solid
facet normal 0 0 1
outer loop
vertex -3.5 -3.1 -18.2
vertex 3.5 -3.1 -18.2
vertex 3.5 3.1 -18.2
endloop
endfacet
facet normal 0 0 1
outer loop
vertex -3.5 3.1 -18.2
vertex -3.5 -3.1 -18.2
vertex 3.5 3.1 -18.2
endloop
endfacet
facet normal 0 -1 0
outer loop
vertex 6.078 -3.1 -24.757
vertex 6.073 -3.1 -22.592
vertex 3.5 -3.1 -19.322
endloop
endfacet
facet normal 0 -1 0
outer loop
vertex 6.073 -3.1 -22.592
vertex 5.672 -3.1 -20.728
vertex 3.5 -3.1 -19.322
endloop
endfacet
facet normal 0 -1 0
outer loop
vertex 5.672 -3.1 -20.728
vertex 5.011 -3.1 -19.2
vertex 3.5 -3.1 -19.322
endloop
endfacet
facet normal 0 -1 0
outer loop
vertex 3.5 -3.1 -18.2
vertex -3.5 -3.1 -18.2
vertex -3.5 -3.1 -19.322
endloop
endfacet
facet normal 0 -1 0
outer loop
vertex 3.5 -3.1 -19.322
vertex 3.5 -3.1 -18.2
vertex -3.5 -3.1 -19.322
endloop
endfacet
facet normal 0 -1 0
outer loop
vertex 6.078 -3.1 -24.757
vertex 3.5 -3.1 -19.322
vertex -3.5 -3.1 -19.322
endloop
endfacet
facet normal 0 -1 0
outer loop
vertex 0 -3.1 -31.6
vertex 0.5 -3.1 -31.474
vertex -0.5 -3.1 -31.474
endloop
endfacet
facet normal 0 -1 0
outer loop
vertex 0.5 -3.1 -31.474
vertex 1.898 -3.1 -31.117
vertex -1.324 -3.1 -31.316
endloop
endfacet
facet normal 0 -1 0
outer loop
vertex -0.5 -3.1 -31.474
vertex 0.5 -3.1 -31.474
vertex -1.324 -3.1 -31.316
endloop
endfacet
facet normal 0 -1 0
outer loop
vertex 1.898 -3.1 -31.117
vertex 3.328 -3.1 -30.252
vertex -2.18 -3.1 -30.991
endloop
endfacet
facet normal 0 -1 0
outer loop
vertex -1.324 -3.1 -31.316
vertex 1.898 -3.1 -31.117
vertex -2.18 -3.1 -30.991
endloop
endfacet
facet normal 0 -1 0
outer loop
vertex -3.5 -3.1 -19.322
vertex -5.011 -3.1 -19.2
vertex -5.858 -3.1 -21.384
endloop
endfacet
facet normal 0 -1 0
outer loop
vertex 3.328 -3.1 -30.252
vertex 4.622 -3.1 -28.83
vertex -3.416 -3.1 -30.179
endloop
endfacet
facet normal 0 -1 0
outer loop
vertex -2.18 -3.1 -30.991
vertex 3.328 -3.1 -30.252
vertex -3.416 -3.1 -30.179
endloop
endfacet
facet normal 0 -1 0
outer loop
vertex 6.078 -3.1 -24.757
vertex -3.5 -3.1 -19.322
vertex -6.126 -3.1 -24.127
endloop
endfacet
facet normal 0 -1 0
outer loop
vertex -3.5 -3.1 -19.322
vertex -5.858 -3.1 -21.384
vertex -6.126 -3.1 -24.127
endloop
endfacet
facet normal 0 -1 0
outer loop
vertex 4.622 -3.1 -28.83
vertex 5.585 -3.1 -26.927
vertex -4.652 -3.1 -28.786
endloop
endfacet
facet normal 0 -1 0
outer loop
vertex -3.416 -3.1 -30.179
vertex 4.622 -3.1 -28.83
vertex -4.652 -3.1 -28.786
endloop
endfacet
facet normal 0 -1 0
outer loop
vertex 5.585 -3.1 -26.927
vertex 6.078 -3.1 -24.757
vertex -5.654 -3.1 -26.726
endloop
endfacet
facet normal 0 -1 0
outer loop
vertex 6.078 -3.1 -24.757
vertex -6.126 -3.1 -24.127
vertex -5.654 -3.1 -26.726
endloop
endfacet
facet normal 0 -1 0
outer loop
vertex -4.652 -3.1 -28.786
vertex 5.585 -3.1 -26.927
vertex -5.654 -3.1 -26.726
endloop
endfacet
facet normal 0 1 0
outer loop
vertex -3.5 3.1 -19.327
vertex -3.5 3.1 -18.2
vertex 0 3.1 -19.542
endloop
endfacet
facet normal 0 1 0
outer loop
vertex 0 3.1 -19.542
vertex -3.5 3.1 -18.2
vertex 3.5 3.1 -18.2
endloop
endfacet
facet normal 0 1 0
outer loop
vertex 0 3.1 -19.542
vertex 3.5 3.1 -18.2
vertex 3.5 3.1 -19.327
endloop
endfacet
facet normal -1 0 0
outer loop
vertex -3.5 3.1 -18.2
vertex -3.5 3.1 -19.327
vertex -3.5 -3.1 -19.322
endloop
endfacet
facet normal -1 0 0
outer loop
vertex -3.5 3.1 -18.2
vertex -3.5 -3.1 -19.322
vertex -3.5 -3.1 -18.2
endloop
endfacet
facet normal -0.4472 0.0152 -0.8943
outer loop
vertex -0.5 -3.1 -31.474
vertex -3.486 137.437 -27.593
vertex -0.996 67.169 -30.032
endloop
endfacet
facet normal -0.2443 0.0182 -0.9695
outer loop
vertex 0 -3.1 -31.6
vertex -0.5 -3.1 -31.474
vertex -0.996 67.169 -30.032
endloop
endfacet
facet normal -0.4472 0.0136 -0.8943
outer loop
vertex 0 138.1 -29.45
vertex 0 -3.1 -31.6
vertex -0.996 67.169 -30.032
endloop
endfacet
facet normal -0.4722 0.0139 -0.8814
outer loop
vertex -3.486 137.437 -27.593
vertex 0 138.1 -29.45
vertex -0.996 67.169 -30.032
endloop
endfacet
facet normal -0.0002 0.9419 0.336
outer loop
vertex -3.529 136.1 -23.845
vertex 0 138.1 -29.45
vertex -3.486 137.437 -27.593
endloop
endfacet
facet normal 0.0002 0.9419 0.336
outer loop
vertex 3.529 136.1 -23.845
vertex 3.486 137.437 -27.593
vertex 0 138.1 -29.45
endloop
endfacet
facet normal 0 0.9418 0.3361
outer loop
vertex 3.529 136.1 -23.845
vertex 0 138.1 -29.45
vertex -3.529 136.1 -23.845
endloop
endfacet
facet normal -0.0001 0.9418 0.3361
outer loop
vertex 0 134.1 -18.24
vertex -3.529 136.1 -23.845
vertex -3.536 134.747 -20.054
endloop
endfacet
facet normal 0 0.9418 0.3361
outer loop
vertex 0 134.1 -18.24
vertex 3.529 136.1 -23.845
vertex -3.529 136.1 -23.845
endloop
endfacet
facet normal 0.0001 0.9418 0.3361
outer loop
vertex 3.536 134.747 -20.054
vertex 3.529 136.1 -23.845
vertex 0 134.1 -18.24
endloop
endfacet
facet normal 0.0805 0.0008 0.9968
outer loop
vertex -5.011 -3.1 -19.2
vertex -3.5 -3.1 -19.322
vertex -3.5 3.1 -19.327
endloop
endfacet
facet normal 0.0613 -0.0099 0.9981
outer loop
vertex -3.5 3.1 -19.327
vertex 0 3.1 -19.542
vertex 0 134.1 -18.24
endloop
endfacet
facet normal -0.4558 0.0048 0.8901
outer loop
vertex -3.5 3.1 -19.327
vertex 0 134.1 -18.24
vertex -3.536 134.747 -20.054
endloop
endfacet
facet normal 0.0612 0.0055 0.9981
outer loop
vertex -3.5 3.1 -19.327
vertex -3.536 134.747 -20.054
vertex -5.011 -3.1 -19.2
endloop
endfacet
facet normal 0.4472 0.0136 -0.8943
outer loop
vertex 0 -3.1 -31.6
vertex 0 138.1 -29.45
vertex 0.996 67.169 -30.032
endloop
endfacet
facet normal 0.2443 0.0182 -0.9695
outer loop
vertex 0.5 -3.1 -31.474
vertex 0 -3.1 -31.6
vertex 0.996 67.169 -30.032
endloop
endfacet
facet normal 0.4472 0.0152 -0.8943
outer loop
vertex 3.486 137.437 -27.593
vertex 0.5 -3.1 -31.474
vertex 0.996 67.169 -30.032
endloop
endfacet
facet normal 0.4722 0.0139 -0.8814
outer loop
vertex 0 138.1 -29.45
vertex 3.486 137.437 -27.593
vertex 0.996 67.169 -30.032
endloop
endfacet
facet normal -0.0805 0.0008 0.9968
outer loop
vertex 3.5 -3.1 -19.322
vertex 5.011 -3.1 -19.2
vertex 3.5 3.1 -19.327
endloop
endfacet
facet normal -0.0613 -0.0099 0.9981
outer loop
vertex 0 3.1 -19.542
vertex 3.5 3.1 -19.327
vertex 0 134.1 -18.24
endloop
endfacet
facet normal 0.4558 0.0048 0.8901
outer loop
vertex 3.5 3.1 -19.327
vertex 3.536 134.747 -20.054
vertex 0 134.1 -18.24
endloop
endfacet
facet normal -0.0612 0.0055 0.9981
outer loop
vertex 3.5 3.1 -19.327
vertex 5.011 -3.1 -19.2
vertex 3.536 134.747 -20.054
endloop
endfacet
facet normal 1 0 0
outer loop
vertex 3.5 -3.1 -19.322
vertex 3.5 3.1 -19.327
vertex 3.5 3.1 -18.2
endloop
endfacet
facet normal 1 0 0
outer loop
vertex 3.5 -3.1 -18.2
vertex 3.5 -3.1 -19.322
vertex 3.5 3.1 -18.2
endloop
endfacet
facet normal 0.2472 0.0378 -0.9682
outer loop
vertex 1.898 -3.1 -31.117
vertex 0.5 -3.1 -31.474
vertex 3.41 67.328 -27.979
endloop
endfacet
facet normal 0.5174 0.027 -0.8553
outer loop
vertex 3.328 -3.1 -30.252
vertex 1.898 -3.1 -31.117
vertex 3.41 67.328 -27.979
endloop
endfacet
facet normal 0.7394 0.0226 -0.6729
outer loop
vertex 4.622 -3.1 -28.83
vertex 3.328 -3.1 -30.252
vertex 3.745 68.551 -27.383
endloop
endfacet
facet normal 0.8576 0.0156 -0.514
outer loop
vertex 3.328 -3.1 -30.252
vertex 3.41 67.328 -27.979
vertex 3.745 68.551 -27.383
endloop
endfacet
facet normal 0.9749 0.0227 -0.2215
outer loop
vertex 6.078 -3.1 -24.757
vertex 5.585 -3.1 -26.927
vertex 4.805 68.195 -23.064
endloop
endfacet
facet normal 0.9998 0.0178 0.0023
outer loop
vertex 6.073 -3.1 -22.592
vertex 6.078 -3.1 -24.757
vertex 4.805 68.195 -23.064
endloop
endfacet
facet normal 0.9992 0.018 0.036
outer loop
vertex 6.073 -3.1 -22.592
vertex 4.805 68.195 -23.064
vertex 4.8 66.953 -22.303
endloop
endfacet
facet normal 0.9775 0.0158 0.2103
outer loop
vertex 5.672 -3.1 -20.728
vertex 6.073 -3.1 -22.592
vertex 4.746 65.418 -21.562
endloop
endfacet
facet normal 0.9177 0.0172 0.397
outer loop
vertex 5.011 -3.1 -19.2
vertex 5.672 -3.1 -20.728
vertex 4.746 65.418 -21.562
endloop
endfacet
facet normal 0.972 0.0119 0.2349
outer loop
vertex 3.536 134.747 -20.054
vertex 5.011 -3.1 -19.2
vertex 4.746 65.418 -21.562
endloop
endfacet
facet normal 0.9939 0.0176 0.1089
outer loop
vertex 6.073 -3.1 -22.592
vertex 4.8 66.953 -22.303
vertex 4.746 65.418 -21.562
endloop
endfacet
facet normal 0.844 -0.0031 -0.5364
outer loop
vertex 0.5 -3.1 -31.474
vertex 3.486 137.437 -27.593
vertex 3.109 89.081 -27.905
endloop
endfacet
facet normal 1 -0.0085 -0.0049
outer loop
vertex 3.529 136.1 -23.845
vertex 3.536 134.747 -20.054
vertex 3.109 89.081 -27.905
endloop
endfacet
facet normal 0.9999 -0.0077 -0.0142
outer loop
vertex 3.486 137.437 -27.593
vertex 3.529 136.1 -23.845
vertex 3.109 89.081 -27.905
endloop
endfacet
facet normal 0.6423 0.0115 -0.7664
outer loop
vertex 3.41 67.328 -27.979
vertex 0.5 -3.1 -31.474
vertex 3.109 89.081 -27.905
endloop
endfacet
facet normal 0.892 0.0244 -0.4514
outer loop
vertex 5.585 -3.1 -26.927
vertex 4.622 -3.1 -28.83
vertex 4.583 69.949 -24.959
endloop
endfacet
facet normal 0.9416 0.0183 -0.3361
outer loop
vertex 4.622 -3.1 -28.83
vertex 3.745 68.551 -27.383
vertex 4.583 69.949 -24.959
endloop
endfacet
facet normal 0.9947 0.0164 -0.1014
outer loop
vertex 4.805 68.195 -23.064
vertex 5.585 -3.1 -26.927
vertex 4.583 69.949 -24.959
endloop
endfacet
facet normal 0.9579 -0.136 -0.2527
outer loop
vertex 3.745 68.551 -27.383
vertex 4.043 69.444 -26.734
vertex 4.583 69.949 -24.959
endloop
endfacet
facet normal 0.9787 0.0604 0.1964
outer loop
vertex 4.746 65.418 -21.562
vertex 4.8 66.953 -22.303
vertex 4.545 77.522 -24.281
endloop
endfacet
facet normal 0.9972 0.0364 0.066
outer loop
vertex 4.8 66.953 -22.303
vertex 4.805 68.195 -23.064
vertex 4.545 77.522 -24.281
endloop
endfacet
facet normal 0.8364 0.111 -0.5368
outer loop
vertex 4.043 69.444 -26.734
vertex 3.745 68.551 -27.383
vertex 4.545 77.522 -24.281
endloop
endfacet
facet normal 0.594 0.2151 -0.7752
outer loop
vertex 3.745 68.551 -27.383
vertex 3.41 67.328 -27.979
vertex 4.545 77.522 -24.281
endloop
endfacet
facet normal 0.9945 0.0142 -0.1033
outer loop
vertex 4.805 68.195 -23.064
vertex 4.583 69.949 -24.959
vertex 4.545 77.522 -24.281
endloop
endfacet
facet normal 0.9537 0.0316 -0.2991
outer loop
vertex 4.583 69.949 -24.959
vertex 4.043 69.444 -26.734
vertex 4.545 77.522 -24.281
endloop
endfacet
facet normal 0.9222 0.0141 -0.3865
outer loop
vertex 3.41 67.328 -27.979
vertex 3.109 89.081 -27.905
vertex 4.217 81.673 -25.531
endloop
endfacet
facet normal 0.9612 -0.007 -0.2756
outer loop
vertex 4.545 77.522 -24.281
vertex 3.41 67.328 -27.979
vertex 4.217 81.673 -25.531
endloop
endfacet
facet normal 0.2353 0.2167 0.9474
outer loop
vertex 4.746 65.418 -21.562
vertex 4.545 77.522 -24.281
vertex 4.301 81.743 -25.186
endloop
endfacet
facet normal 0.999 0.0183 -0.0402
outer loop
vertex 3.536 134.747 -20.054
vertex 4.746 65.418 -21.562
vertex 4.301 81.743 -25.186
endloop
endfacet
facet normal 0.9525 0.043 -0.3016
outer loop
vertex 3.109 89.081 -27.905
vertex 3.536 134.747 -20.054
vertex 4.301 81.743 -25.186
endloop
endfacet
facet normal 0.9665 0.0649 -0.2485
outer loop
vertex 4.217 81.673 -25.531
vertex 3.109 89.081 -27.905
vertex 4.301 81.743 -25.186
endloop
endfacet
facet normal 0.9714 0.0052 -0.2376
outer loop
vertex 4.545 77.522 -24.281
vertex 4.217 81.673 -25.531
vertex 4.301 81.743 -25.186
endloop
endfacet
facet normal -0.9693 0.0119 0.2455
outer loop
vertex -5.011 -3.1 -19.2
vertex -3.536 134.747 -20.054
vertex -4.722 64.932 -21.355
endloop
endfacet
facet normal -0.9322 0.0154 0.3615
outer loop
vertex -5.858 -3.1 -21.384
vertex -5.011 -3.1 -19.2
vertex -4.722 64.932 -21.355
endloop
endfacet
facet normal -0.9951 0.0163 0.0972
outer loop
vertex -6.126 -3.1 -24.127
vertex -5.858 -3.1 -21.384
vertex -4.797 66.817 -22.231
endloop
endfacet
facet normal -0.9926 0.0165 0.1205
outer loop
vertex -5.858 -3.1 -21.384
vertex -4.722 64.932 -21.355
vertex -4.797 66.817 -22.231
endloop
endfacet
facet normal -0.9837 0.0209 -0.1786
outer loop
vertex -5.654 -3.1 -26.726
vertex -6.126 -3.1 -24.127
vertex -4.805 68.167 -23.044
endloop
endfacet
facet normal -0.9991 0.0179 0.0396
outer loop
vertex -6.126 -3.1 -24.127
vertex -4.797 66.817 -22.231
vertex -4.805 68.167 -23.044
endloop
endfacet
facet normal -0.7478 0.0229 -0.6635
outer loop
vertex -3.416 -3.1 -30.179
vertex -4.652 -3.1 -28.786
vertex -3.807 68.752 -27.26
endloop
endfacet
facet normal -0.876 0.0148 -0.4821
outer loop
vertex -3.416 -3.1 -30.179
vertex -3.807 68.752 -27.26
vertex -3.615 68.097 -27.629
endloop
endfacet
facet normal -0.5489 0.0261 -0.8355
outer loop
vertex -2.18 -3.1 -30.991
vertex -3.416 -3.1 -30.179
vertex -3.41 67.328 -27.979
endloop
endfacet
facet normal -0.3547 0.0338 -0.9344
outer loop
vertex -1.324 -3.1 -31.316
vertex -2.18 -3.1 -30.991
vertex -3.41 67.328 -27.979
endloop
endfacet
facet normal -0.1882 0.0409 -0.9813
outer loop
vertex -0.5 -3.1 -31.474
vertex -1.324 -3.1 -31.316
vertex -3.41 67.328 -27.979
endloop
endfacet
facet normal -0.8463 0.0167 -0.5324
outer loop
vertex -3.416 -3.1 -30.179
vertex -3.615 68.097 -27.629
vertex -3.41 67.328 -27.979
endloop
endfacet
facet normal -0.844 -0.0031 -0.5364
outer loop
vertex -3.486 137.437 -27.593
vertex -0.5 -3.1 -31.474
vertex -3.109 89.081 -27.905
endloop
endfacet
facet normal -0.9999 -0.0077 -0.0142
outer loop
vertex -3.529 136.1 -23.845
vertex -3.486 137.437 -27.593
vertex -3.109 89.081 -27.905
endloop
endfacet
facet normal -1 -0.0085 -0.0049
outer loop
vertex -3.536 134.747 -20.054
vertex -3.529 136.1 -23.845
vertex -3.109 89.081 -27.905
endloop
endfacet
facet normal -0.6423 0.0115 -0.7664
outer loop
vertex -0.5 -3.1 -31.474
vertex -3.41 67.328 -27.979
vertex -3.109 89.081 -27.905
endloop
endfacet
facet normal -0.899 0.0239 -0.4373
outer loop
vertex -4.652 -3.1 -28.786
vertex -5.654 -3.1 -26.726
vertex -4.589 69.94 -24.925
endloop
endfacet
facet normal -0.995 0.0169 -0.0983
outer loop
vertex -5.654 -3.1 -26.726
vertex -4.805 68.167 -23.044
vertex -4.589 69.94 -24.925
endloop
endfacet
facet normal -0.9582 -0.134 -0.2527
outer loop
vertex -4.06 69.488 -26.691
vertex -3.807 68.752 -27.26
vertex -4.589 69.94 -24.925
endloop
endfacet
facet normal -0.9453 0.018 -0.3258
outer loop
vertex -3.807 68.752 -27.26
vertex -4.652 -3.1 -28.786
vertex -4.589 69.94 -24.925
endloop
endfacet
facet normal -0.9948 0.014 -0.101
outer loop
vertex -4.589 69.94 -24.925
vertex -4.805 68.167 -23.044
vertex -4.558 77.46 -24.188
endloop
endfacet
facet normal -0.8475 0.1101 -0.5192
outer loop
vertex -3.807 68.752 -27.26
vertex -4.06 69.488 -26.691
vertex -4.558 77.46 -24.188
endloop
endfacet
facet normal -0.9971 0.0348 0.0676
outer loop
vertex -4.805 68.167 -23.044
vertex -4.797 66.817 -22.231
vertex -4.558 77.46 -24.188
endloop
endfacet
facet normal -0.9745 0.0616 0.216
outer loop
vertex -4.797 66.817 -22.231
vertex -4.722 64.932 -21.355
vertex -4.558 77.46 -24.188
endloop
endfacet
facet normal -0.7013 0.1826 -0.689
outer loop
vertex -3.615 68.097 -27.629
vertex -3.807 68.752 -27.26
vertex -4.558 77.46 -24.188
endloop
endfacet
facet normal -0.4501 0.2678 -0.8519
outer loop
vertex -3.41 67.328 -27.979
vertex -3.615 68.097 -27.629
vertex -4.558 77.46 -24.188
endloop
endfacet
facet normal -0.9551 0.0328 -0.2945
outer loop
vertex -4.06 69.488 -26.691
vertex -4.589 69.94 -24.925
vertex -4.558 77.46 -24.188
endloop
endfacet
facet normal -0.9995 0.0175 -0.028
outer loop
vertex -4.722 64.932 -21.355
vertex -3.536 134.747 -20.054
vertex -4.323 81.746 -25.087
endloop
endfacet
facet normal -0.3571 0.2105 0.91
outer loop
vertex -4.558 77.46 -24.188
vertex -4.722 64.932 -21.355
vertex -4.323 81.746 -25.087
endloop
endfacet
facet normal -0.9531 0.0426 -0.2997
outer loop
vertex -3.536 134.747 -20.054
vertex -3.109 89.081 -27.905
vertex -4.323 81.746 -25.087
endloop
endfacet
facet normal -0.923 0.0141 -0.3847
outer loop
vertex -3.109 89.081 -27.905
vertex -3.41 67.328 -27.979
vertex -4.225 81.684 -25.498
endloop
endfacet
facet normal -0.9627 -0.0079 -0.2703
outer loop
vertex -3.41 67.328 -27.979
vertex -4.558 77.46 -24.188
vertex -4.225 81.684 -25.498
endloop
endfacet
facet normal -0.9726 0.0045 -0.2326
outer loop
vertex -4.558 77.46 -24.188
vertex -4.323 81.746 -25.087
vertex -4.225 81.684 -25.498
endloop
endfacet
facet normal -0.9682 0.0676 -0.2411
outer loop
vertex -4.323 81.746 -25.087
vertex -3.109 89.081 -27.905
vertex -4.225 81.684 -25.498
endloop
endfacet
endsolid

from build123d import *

# Parameters (mm, degrees)
BOSS_EXTRUDE3_DEPTH = 3.5
CUT_EXTRUDE1_DEPTH  = 5


with BuildPart() as part:
    # Sketch3 → Boss-Extrude3 (new, symmetric)
    with BuildSketch(Plane(origin=(0, 0, 0), x_dir=(0, 0, -1), z_dir=(1, 0, 0))):
        with BuildLine():
            Line((18.2, 3.1), (23.7, 3.1))
            ThreePointArc((23.7, 3.1), (26.8, 0), (23.7, -3.1))
            Line((23.7, -3.1), (18.2, -3.1))
            Line((18.2, -3.1), (18.2, 3.1))
        make_face()
    extrude(amount=BOSS_EXTRUDE3_DEPTH, both=True)

    # Sketch5 → Loft4 section 0
    with BuildSketch(Plane.XZ.offset(3.1)):
        with BuildLine():
            Line((5.011058699, -19.2), (0, -19.603876814))
            Line((0, -19.603876814), (-5.011058699, -19.2))
            add(Edge.make_bspline(
                [(-5.011058699, -19.2), (-11.211254093, -30.360468439), (-0.5, -31.474052325)],
                knots=[4.097432377, 4.097432377, 4.097432377, 6.201595221, 6.201595221, 6.201595221], degree=2, weights=[1, 0.495764497, 1]))
            Line((-0.5, -31.474052325), (0, -31.6))
            Line((0, -31.6), (0.5, -31.474052325))
            add(Edge.make_bspline(
                [(0.5, -31.474052325), (11.211254093, -30.360468439), (5.011058699, -19.2)],
                knots=[0.081590086, 0.081590086, 0.081590086, 2.185752931, 2.185752931, 2.185752931], degree=2, weights=[1, 0.495764497, 1]))
        make_face()
    # Sketch4 → Loft4 section 1
    with BuildSketch(Plane(origin=(0, 138.1, 0), x_dir=(1, 0, 0), z_dir=(0, 1, 0))):
        with BuildLine():
            Line((-3.5, 27.575), (-3.5, 20.075))
            Line((-3.5, 20.075), (0, 18.2))
            Line((0, 18.2), (3.5, 20.075))
            Line((3.5, 20.075), (3.5, 27.575))
            Line((3.5, 27.575), (0, 29.45))
            Line((0, 29.45), (-3.5, 27.575))
        make_face()
    loft()

    # Sketch6 → Cut-Extrude1 (cut, symmetric)
    with BuildSketch(Plane(origin=(0, 0, 0), x_dir=(0, 0, -1), z_dir=(1, 0, 0))):
        Polygon((29.45, 138.1), (18.239769881, 134.1), (18.2, 138.1), align=None)
    extrude(amount=CUT_EXTRUDE1_DEPTH, both=True, mode=Mode.SUBTRACT)


solid = part.part
